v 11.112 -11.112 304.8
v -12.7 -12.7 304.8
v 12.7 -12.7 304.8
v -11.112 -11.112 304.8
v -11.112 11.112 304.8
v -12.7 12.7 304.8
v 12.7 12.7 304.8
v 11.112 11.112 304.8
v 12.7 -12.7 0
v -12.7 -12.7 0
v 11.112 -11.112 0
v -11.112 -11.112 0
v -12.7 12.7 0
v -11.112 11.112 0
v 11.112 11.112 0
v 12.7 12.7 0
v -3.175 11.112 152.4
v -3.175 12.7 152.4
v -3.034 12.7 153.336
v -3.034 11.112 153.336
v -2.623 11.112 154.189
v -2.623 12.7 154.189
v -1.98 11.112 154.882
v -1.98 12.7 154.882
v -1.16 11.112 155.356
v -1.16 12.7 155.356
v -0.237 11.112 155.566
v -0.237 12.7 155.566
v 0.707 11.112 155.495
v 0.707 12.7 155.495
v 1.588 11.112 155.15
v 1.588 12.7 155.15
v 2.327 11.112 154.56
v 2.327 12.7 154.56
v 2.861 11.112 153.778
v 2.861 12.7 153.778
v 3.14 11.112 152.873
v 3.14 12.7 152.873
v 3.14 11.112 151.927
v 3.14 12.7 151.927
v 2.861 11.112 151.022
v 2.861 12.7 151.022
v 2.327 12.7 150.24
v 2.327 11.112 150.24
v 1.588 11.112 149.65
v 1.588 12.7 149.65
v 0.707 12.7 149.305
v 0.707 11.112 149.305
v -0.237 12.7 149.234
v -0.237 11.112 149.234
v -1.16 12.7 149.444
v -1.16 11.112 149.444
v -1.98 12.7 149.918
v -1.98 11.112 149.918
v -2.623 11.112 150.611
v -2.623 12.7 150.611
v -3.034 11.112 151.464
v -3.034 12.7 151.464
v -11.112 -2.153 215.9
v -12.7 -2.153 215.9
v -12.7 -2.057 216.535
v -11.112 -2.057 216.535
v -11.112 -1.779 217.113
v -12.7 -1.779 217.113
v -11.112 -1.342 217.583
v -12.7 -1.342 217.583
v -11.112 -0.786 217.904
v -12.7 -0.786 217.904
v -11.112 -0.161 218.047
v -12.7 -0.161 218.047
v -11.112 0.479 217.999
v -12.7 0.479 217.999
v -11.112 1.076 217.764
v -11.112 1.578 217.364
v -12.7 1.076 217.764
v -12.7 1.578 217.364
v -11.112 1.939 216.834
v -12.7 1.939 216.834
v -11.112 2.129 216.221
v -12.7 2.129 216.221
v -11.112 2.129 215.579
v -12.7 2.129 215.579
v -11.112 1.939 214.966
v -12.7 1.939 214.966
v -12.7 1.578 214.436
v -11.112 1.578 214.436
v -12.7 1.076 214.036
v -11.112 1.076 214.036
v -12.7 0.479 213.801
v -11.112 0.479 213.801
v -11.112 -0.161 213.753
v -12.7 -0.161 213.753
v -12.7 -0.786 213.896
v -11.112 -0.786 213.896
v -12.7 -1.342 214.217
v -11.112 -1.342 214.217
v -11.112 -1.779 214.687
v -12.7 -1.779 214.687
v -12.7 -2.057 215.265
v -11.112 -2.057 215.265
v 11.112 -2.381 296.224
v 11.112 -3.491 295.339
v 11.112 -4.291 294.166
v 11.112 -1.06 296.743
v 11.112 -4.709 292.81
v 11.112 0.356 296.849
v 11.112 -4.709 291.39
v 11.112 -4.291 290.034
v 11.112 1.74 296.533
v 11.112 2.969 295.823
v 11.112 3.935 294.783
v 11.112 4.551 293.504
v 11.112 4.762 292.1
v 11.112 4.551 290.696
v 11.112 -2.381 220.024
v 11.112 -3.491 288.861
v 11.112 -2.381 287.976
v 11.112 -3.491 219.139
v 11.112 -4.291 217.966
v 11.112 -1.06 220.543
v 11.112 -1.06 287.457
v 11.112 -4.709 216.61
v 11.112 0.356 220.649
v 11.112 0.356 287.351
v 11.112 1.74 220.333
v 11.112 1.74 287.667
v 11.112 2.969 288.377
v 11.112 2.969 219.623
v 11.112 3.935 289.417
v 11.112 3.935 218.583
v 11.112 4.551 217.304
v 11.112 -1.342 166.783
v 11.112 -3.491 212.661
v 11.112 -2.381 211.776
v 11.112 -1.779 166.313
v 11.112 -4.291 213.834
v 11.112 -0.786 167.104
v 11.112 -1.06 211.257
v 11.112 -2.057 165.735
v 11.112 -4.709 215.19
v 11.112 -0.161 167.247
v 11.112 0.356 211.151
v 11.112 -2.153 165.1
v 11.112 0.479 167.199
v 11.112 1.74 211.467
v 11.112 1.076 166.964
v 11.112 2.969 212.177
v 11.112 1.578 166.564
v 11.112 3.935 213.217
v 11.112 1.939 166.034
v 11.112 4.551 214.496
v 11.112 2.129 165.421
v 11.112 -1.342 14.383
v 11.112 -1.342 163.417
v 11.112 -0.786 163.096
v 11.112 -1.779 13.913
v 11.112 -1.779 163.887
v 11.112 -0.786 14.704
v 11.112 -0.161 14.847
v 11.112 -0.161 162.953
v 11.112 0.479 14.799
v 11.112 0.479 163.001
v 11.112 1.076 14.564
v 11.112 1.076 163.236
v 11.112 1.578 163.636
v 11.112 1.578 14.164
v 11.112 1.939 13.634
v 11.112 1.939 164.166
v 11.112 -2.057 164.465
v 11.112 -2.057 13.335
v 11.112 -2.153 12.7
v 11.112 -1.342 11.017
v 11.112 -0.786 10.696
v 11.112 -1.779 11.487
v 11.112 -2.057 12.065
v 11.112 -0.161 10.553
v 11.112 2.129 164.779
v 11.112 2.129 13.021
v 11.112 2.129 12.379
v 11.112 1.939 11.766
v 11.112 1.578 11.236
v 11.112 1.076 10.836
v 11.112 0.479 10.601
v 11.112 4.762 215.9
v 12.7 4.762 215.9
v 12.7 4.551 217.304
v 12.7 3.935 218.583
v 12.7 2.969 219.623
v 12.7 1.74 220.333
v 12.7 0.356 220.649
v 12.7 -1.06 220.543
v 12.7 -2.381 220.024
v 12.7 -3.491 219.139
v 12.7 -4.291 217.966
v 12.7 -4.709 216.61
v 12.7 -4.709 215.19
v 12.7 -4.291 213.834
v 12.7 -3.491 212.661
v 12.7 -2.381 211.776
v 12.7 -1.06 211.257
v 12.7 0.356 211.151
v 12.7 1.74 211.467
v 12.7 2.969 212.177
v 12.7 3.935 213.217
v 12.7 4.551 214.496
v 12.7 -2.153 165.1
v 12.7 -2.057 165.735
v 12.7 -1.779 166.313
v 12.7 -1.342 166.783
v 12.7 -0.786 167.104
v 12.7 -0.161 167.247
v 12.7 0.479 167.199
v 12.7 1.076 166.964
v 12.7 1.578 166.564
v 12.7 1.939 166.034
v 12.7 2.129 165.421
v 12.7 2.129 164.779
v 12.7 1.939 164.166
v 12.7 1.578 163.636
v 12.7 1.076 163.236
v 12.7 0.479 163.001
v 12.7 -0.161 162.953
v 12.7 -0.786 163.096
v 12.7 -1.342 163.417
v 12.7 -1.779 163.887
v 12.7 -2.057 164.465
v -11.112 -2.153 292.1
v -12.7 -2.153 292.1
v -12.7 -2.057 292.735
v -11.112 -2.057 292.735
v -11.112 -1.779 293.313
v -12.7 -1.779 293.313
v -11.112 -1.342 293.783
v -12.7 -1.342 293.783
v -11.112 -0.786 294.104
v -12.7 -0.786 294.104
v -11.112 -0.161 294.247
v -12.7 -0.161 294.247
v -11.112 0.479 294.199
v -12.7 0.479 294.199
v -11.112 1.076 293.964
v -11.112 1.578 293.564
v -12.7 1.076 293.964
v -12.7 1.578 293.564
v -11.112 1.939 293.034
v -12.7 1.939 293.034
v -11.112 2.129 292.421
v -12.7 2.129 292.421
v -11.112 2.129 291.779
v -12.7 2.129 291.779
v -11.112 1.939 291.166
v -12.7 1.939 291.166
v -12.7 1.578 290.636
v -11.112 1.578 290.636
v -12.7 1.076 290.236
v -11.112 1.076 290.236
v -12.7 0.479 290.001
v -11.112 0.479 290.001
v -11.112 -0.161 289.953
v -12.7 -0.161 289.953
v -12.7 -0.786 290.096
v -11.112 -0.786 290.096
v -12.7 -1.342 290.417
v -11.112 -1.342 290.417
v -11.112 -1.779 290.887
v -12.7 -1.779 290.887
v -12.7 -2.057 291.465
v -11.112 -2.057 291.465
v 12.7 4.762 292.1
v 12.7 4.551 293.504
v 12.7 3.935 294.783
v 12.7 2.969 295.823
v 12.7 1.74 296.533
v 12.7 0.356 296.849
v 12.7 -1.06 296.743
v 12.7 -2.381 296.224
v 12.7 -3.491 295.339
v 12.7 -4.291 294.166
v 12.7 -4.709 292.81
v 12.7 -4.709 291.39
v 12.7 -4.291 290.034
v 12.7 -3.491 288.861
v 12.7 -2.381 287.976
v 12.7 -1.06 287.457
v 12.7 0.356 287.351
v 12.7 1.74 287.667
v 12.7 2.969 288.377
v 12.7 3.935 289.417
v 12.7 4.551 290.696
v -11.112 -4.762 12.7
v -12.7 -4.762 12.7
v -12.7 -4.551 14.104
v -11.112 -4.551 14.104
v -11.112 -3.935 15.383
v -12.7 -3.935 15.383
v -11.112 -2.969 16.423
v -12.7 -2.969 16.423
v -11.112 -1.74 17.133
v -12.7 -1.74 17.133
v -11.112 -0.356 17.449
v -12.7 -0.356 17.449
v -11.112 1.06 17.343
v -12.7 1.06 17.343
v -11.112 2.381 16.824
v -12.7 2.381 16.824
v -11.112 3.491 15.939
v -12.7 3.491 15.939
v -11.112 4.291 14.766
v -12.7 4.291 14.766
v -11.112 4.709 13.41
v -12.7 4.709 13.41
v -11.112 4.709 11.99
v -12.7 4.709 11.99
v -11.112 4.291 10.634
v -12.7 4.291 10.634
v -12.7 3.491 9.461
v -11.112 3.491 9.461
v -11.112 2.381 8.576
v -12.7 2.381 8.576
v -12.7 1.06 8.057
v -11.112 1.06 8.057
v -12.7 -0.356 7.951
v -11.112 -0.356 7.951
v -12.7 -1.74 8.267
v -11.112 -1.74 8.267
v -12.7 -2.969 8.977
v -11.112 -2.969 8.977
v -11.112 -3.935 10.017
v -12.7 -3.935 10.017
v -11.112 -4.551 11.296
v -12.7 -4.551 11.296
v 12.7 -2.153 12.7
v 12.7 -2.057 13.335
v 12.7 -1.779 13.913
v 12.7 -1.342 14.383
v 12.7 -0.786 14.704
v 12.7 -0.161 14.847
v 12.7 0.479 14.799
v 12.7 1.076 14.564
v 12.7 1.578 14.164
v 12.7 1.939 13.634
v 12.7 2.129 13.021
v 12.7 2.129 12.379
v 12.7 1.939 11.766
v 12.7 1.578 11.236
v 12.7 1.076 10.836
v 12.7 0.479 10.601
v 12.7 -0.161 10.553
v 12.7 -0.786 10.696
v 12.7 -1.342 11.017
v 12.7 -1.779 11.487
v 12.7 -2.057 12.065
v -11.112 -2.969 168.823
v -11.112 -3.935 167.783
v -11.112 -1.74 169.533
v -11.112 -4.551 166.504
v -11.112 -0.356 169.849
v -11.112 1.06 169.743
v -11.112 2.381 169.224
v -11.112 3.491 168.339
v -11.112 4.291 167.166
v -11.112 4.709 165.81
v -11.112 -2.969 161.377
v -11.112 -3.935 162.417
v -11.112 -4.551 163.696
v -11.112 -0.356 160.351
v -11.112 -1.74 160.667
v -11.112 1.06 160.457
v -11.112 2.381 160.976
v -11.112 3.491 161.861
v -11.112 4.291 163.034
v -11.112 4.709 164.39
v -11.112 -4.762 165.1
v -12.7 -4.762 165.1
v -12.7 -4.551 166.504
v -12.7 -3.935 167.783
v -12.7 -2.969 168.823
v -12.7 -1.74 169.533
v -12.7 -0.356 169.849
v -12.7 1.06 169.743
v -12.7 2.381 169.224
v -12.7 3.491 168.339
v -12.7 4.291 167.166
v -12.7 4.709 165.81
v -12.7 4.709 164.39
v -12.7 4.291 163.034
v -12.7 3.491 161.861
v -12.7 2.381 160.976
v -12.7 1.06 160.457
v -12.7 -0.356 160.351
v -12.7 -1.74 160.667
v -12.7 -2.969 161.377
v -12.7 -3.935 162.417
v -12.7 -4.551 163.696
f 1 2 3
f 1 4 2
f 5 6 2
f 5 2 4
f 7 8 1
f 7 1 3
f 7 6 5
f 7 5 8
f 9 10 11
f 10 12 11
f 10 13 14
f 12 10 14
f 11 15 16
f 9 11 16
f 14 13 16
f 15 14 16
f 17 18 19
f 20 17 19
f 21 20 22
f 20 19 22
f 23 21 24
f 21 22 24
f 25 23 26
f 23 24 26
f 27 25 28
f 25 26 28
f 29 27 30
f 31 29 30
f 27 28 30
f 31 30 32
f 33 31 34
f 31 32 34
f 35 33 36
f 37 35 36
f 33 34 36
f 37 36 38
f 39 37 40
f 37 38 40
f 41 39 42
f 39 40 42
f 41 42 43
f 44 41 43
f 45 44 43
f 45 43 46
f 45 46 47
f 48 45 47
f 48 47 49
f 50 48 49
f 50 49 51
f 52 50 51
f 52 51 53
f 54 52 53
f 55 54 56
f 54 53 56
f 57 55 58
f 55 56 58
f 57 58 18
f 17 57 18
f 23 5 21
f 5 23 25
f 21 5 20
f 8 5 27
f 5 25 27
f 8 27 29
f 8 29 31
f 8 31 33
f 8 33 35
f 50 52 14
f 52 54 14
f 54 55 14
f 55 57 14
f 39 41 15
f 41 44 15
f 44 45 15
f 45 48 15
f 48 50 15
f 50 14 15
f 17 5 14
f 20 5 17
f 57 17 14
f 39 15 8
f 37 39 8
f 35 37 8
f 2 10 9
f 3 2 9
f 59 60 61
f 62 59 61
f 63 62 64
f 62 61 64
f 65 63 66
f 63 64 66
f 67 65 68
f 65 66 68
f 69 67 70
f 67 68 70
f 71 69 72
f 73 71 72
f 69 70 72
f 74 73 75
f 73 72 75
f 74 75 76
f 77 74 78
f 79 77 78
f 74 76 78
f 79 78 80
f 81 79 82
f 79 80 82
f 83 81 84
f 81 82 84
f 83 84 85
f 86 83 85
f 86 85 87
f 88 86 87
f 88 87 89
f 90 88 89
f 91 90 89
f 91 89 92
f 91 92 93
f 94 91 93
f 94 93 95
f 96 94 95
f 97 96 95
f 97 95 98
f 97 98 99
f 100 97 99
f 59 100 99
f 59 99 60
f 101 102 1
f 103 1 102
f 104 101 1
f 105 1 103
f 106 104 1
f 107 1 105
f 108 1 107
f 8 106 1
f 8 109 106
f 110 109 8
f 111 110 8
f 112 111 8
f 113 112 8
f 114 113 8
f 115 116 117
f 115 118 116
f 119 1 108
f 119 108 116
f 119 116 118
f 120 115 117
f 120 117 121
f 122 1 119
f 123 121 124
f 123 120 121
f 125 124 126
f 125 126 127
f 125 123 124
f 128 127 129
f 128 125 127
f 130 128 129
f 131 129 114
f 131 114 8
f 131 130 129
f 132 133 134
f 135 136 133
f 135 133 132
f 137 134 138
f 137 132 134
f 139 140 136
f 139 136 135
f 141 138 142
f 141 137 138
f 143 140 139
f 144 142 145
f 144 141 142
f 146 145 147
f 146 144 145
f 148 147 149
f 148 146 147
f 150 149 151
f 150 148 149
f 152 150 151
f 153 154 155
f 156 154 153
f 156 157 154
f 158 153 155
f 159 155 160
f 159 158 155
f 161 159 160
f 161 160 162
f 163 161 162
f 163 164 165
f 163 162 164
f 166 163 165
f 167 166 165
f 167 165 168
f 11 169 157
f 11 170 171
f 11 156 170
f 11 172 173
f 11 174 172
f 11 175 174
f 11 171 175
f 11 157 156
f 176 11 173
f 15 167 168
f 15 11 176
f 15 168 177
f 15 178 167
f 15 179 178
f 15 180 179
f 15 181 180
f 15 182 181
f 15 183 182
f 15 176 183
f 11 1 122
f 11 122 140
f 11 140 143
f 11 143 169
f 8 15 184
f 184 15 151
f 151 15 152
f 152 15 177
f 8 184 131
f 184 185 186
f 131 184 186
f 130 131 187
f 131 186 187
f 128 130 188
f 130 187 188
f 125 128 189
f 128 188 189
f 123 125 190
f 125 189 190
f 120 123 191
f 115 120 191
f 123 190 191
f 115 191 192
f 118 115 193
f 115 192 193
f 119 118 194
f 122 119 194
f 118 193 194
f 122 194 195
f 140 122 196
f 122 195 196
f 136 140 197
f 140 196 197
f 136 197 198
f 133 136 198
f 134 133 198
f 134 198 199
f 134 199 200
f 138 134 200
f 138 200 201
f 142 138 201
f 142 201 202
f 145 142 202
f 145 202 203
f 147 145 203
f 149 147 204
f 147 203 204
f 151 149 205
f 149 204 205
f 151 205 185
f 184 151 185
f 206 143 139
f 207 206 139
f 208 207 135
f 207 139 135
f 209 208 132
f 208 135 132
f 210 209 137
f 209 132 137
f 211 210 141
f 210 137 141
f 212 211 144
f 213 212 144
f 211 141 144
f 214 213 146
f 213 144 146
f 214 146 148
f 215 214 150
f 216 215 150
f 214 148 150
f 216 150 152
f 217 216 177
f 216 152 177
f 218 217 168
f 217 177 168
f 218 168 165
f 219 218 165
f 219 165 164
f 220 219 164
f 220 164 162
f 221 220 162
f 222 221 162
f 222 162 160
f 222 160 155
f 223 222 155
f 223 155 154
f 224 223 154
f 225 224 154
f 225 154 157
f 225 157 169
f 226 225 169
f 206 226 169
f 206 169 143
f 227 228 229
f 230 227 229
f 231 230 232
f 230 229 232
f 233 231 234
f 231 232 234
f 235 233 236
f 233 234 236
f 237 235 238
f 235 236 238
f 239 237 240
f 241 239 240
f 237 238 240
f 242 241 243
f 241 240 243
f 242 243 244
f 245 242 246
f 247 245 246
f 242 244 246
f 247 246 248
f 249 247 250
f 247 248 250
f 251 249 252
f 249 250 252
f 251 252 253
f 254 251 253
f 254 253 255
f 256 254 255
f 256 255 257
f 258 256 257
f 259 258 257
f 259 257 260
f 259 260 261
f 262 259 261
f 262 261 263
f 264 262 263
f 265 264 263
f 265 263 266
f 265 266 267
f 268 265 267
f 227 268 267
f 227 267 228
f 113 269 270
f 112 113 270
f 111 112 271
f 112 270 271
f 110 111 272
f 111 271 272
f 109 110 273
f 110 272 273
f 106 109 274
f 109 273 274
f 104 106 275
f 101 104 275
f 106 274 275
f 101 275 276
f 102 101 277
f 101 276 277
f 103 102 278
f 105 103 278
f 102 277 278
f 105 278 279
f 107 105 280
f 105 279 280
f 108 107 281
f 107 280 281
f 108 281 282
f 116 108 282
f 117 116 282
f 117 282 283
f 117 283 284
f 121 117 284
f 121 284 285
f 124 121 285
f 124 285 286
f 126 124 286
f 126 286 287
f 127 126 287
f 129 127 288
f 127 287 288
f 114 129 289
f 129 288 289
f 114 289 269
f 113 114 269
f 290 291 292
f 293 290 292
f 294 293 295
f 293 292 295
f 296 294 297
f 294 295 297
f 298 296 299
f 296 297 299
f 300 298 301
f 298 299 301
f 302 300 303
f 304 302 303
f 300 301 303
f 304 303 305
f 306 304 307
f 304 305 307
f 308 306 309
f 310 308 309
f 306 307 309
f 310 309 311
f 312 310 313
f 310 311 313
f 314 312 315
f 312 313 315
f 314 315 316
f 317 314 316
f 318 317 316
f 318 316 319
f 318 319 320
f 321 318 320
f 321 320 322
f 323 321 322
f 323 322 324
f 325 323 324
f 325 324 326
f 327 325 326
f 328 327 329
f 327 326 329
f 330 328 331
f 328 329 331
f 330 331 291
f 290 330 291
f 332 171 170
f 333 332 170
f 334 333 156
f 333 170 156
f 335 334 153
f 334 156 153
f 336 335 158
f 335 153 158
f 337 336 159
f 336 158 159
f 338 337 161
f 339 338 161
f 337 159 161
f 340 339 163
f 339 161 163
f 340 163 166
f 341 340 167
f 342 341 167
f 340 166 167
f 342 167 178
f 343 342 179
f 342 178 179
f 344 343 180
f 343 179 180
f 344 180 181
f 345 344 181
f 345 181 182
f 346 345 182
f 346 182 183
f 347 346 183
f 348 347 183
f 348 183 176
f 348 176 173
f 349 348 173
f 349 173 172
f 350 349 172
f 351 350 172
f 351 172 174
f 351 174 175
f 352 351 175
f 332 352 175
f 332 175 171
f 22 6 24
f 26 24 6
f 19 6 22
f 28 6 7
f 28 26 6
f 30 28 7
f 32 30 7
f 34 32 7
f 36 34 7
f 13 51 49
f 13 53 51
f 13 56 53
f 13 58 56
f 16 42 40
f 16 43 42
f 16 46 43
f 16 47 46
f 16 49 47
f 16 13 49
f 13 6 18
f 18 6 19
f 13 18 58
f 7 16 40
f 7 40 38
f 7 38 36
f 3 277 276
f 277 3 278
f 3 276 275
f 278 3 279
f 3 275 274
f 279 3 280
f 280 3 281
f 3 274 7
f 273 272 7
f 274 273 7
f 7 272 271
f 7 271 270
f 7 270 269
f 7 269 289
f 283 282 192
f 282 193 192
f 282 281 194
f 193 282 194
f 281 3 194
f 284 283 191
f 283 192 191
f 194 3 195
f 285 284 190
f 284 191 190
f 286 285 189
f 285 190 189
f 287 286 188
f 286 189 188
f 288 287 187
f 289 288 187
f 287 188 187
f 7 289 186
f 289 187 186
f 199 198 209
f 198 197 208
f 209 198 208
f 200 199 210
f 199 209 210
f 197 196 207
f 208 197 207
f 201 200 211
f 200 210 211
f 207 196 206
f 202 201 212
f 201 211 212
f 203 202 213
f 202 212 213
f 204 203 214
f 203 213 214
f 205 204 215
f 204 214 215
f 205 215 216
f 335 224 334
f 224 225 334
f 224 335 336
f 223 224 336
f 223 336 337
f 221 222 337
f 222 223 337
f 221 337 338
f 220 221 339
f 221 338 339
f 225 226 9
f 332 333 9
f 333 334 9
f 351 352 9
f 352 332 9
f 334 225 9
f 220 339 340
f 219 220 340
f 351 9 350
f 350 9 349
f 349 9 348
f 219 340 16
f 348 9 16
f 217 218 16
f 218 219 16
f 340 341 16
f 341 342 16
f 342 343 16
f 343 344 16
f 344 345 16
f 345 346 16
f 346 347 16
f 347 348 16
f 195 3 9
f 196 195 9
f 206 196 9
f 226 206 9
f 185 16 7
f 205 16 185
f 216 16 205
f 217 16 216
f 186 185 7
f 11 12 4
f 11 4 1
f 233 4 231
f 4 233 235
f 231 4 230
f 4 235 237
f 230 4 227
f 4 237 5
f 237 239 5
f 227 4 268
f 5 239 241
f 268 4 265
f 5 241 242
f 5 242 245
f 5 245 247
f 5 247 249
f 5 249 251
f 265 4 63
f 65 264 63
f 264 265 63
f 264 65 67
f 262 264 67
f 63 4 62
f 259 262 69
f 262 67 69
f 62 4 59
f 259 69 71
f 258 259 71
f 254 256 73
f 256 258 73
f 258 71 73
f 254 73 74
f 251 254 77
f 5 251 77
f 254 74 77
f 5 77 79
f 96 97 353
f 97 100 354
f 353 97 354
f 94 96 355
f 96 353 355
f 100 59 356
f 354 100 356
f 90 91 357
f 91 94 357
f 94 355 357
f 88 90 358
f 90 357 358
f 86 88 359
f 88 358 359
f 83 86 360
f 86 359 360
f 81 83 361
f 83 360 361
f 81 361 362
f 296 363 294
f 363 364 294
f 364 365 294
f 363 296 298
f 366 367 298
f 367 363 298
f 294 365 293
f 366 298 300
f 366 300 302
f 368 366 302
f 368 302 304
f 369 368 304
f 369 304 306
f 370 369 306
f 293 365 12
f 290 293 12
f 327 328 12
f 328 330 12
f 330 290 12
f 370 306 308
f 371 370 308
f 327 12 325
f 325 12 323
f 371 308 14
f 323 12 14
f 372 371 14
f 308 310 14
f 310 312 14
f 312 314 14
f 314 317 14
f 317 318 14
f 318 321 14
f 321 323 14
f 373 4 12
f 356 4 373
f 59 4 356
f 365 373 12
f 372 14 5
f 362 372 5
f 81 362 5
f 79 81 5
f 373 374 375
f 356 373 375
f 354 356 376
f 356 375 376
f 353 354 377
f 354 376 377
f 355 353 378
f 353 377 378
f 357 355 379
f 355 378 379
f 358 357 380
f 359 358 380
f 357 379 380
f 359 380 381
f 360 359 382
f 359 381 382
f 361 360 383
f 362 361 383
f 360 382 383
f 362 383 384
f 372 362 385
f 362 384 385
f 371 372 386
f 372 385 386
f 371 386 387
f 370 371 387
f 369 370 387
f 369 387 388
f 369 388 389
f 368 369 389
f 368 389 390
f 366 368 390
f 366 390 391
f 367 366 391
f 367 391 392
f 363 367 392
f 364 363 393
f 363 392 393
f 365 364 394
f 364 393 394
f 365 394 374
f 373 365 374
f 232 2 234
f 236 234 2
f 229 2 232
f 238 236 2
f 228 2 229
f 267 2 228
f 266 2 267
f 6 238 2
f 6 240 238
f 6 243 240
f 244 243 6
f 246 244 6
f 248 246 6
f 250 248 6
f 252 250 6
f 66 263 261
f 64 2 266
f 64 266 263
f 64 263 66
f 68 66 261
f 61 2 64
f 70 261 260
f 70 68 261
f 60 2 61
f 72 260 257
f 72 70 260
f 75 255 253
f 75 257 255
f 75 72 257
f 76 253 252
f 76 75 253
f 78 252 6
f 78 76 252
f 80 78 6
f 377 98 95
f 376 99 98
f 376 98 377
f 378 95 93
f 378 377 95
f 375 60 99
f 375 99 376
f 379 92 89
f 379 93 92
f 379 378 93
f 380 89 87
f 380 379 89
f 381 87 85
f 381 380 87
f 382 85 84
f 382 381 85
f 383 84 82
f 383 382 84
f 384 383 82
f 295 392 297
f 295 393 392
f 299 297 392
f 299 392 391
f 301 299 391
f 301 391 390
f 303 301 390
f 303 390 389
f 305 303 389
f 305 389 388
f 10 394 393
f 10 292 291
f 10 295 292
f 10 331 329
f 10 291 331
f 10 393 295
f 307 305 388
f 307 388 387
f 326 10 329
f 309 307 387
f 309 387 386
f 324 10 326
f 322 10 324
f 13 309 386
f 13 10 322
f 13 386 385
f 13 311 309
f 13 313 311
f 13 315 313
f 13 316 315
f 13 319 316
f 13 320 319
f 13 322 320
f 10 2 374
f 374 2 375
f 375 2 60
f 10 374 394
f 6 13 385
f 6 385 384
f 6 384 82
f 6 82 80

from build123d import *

# Parameters (mm, degrees)
F0_W     = 25.4
F0_H     = 25.4
F0_W_2   = 22.225
F0_H_2   = 22.225
F1_DEPTH = 304.8
F2_R     = 3.175
F3_DEPTH = 1.5875
F4_R     = 2.15265
F5_DEPTH = 25.4
F6_R     = 4.7625
F7_DEPTH = 1.5875
F8_R     = 4.7625
F9_DEPTH = 1.5875


with BuildPart() as f1:
    # F0 (on Top) → F1 (new body)
    with BuildSketch(Plane.XY):
        Rectangle(F0_W, F0_H)
        Rectangle(F0_W_2, F0_H_2, mode=Mode.SUBTRACT)
    extrude(amount=F1_DEPTH)

    # F2 (on face) → F3 (cut, through all)
    with BuildSketch(Plane(origin=(0, 12.7, 0), x_dir=(-1, 0, 0), z_dir=(0, 1, 0))):
        with Locations((0, 152.4)):
            Circle(F2_R)
    extrude(amount=-F3_DEPTH, mode=Mode.SUBTRACT)

    # F4 (on face) → F5 (cut, through all)
    with BuildSketch(Plane(origin=(-12.7, 0, 0), x_dir=(0, -1, 0), z_dir=(-1, 0, 0))):
        with Locations((0, 12.7)):
            Circle(F4_R)
        with Locations((0, 165.1)):
            Circle(F4_R)
        with Locations((0, 292.1)):
            Circle(F4_R)
        with Locations((0, 215.9)):
            Circle(F4_R)
    extrude(amount=-F5_DEPTH, mode=Mode.SUBTRACT)

    # F6 (on face) → F7 (cut, through all)
    with BuildSketch(Plane.YZ.offset(12.7)):
        with Locations((0, 292.1)):
            Circle(F6_R)
        with Locations((0, 215.9)):
            Circle(F6_R)
    extrude(amount=-F7_DEPTH, mode=Mode.SUBTRACT)

    # F8 (on face) → F9 (cut, through all)
    with BuildSketch(Plane(origin=(-12.7, 0, 0), x_dir=(0, -1, 0), z_dir=(-1, 0, 0))):
        with Locations((0, 165.1)):
            Circle(F8_R)
        with Locations((0, 12.7)):
            Circle(F8_R)
    extrude(amount=-F9_DEPTH, mode=Mode.SUBTRACT)


solid = f1.part
